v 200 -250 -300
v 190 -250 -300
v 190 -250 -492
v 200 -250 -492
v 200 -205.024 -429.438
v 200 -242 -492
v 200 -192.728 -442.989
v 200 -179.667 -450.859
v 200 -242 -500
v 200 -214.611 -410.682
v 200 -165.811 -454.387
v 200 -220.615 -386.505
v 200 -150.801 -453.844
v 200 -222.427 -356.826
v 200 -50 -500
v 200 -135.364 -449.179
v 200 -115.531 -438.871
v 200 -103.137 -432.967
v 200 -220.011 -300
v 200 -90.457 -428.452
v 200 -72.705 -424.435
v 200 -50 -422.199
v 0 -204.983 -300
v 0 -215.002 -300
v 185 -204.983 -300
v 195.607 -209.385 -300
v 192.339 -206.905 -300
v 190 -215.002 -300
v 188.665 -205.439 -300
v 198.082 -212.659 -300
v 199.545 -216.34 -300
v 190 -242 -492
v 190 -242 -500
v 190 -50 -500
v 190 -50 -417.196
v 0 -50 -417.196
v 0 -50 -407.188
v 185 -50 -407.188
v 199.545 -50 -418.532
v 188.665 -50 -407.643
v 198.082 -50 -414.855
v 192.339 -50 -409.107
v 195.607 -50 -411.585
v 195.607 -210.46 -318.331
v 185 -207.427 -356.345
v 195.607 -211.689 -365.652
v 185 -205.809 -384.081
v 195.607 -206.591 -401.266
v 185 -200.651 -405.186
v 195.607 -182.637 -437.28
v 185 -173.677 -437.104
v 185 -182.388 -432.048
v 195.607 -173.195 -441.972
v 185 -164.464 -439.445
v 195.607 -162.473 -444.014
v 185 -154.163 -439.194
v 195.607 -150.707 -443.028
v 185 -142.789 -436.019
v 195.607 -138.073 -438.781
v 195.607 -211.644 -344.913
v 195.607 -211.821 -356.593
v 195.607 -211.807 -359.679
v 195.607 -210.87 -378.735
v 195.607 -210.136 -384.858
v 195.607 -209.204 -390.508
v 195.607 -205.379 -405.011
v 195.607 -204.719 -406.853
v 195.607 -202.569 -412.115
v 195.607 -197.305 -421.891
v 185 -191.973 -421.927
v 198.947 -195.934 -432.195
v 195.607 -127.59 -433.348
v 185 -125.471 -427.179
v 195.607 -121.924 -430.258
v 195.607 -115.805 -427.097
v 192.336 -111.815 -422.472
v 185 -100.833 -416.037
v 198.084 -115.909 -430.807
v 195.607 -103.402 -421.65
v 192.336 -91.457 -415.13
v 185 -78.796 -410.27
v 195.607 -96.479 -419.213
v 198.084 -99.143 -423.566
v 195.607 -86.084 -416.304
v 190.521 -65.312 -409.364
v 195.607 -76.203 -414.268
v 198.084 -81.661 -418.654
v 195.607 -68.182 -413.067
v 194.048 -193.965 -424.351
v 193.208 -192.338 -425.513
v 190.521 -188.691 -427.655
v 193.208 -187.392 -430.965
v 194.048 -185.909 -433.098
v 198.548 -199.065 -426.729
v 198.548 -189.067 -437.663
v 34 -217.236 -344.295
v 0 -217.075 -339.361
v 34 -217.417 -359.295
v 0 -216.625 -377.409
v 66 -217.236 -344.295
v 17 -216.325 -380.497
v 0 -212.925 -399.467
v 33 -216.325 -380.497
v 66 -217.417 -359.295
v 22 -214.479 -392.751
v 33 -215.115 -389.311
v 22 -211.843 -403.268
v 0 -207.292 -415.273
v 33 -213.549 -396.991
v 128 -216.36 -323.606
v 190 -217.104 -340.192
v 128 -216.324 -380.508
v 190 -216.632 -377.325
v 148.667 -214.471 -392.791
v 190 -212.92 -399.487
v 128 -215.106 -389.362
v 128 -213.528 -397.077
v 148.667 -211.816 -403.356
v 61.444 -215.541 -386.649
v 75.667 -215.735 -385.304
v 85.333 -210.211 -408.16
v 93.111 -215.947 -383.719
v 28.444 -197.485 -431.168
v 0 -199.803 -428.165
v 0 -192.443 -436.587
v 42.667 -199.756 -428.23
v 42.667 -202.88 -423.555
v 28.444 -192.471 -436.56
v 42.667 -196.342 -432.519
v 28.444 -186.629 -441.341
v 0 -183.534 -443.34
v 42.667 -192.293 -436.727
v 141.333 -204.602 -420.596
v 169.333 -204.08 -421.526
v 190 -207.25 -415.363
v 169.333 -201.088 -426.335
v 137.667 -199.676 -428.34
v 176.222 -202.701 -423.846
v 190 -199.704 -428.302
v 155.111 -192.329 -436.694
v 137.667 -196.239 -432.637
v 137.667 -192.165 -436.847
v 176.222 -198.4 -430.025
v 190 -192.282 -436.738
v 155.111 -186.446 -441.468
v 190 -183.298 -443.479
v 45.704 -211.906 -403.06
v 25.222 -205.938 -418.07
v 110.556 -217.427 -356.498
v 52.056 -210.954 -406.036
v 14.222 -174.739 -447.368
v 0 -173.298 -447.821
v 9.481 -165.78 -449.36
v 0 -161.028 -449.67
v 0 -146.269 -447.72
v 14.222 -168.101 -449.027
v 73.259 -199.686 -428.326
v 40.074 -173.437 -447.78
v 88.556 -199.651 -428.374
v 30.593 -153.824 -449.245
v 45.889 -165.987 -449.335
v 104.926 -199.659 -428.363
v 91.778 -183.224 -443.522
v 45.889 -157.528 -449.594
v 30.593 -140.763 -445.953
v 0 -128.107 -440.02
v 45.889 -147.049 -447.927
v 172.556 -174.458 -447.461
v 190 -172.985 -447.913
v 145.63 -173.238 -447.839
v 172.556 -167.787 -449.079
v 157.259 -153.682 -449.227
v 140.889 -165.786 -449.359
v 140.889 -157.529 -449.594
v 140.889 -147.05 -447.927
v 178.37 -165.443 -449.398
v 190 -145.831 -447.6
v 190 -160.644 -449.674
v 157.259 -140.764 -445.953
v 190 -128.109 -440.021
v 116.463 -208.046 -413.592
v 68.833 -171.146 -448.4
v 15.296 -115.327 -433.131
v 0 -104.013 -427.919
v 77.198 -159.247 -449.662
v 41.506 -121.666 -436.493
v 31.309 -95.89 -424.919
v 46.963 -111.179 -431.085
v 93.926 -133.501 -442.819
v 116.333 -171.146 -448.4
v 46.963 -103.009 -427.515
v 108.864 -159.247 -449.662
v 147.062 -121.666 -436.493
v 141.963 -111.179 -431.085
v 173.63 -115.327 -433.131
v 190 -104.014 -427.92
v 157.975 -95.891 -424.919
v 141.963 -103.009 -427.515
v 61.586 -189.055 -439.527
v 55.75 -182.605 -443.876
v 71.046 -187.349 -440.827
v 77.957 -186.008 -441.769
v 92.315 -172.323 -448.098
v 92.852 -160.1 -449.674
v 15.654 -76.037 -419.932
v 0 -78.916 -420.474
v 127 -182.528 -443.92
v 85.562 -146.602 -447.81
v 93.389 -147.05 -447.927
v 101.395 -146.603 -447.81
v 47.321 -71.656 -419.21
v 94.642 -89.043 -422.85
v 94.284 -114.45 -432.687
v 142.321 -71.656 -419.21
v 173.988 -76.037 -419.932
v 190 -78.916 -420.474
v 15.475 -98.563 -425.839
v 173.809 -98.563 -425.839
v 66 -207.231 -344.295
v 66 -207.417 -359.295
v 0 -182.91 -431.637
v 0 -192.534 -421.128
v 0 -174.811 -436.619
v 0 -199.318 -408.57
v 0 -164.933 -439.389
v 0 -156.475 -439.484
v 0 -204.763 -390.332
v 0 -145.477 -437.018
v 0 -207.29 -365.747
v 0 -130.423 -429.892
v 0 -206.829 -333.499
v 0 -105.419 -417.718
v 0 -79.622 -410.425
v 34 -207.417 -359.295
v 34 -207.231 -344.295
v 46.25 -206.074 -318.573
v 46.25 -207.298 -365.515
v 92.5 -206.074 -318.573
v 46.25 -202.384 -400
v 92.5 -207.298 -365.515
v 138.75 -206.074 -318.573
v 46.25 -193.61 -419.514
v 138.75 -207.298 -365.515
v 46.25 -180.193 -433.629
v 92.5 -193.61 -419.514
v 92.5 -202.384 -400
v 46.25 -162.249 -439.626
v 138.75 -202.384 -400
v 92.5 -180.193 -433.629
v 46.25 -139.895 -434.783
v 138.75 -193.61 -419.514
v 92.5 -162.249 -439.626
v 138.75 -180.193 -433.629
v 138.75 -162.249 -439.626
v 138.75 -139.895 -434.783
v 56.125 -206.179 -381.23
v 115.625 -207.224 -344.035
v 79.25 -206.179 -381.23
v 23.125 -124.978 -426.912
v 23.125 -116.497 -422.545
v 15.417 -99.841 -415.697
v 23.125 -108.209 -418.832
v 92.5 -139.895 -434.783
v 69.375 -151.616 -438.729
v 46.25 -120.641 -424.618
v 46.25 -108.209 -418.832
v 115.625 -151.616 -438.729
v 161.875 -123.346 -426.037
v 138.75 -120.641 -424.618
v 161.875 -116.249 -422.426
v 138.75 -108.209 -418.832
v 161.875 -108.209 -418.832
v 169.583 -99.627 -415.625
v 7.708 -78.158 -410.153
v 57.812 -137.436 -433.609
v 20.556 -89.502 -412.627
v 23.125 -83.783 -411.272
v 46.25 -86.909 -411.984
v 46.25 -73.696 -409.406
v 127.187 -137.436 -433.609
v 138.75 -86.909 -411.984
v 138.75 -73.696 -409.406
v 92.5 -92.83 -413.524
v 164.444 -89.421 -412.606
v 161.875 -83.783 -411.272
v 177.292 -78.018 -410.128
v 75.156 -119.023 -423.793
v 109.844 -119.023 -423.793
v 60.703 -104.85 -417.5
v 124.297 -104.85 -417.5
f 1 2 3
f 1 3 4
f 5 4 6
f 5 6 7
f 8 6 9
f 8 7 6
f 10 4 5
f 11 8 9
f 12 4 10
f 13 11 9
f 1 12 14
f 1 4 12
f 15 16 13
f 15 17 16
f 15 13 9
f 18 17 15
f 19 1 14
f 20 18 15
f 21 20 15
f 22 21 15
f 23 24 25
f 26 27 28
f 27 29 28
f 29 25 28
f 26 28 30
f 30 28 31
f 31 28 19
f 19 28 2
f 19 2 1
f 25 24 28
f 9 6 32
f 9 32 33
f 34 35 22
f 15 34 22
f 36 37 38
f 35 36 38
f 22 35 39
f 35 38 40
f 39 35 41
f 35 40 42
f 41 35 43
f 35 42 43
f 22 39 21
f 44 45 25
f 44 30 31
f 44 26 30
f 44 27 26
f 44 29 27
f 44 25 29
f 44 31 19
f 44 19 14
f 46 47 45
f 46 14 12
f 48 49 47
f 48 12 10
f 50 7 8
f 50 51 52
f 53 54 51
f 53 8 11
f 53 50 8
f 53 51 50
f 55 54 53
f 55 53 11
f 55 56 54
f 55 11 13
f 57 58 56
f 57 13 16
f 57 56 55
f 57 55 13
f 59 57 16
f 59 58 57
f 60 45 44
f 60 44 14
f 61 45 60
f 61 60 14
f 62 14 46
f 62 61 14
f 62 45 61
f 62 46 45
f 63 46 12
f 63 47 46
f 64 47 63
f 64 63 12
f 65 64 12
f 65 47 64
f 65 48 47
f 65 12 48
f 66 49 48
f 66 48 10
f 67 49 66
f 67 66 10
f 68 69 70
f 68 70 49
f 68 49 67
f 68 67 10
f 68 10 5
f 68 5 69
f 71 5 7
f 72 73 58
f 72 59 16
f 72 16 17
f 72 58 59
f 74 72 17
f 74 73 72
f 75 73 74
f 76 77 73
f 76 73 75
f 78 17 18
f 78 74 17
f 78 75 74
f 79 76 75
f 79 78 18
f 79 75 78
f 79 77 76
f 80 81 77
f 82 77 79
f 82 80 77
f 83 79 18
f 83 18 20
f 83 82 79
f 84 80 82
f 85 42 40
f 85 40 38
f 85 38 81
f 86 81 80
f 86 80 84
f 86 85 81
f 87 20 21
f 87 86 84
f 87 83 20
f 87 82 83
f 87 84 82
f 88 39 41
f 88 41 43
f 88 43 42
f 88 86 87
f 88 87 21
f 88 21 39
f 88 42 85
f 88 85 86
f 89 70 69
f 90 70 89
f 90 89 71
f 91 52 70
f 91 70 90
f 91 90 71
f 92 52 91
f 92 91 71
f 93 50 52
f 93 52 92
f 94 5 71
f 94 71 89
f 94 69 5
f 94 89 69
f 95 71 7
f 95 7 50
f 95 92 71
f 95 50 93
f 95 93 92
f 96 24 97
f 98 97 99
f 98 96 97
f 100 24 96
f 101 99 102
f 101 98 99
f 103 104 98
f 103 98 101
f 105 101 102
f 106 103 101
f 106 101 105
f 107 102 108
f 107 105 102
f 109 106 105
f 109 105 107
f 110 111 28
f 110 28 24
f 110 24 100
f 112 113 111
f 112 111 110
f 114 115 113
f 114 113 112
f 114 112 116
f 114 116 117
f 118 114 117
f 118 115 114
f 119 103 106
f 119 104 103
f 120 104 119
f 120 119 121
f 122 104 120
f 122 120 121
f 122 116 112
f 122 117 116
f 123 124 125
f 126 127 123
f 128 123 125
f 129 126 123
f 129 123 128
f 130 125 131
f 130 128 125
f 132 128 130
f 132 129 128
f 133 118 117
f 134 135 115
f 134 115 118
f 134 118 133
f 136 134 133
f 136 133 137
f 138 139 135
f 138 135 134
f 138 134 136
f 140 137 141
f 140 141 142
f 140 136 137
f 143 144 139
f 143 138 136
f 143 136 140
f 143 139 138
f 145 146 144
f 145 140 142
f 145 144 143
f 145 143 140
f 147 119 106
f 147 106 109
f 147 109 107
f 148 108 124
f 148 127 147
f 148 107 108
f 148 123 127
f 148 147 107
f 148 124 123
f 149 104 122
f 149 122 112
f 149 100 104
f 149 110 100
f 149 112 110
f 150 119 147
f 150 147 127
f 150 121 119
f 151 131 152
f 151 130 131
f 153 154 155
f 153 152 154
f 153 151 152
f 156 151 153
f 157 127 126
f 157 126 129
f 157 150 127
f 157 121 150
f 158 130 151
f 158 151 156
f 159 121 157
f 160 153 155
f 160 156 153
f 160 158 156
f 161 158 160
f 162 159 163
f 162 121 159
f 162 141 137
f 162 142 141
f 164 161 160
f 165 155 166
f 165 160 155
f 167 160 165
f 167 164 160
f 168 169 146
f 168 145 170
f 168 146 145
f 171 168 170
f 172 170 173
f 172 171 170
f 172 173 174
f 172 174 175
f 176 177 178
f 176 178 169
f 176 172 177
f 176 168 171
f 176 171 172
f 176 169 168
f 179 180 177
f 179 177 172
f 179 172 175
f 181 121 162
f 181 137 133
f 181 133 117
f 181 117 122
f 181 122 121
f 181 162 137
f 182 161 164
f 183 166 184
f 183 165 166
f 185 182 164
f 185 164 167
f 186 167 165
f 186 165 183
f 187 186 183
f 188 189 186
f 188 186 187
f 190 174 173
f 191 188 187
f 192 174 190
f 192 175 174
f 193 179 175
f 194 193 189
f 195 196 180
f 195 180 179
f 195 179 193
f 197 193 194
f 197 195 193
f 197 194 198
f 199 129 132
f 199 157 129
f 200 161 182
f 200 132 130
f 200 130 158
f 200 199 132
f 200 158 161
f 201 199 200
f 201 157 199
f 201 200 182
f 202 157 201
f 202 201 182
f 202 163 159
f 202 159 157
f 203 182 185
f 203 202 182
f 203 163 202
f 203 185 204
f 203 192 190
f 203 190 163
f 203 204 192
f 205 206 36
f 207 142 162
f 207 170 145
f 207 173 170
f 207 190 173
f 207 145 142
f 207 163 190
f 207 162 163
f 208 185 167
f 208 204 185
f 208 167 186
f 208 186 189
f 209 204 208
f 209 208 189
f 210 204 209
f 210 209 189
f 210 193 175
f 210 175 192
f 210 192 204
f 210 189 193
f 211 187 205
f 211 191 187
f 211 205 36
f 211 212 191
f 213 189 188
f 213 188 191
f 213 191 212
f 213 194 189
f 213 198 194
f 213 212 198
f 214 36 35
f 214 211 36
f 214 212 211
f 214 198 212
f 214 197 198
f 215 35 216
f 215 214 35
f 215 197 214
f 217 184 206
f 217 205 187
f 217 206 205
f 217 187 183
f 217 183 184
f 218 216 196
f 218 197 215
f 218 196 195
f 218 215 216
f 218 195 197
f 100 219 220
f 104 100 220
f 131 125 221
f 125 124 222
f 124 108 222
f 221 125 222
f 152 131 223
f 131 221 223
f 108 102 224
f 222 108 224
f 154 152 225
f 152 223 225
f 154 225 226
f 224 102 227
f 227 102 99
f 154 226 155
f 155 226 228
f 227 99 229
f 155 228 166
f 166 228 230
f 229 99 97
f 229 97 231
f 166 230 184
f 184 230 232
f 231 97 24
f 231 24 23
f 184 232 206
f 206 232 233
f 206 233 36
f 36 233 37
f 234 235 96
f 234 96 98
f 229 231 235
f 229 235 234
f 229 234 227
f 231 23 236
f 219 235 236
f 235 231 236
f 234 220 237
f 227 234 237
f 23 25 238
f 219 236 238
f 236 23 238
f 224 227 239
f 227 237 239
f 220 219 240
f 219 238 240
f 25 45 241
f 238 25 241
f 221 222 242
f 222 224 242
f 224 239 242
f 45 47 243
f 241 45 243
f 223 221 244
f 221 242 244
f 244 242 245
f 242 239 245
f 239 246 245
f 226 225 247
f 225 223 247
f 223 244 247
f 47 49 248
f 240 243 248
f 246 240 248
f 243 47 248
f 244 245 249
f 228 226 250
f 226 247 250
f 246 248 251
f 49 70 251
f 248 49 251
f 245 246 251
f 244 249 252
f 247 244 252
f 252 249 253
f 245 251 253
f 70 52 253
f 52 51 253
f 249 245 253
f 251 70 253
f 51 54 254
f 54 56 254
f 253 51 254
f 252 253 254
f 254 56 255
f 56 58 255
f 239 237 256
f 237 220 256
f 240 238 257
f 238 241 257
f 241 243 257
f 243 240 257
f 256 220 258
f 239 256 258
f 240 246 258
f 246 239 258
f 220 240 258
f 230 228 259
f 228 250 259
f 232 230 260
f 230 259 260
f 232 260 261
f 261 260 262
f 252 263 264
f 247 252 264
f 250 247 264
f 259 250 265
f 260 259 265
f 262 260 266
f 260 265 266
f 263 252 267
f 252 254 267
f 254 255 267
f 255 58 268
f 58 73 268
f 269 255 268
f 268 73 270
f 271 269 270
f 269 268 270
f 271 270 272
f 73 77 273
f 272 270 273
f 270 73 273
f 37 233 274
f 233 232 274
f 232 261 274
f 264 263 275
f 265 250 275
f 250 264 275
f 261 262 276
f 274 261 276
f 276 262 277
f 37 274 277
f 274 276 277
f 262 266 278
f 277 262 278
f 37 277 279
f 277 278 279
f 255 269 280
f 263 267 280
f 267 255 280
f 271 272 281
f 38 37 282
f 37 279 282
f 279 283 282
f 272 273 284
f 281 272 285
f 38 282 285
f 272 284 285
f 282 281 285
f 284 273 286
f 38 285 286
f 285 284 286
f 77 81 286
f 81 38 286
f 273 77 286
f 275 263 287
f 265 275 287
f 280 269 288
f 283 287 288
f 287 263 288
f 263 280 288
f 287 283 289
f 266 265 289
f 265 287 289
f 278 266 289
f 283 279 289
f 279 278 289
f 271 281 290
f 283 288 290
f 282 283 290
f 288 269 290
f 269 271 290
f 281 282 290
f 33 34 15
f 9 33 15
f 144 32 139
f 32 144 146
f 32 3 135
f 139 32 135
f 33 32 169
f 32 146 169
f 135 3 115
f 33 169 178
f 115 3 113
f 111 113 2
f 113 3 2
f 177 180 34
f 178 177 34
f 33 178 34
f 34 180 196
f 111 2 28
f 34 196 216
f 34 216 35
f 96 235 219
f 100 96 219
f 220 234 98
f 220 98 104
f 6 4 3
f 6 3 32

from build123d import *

# Parameters (mm, degrees)
SKETCH_1_W           = 80
SKETCH_1_H           = 100
EXTRUDE_1_DEPTH      = 100
SKETCH_2_W           = 80
SKETCH_2_H           = 85
CUT_EXTRUDE_1_DEPTH  = 90
CUT_EXTRUDE_5_DEPTH  = 138.477270849
SHELL_2_T            = -2
FILLET_1_R           = 3
FILLET_2_R           = 5
FILLET_3_R           = 3
SKETCH_6_W           = 3.8
SKETCH_6_H           = 2.5
CUT_EXTRUDE_6_DEPTH  = 85
SKETCH_8_W           = 6.4
SKETCH_8_H           = 3
CUT_EXTRUDE_7_DEPTH  = 100
SKETCH_11_W          = 2
SKETCH_11_H          = 1
CUT_EXTRUDE_8_DEPTH  = 119.74342103
SCALE_1_SCALE        = 5
SKETCH_12_W          = 400
SKETCH_12_H          = 300
SKETCH_12_W_2        = 185
SKETCH_12_H_2        = 29.670884313
CUT_EXTRUDE_11_DEPTH = 594.717104512
SKETCH_14_W          = 200
SKETCH_14_H          = 300
CUT_EXTRUDE_12_DEPTH = 575.45626481
SKETCH_15_W          = 8
SKETCH_15_H          = 8
CUT_EXTRUDE_13_DEPTH = 10


with BuildPart() as part:
    # 스케치1 → 보스-돌출1 (new body)
    with BuildSketch(Plane.XY):
        Rectangle(SKETCH_1_W, SKETCH_1_H)
    extrude(amount=-EXTRUDE_1_DEPTH)

    # 스케치2 → 컷-돌출1 (cut)
    with BuildSketch(Plane(origin=(40, 0, 0), x_dir=(0, 0, -1), z_dir=(1, 0, 0))):
        with Locations((40, 7.5)):
            Rectangle(SKETCH_2_W, SKETCH_2_H)
    extrude(amount=-CUT_EXTRUDE_1_DEPTH, mode=Mode.SUBTRACT)

    # 스케치5 → 컷-돌출5 (cut, through all)
    with BuildSketch(Plane(origin=(40, 0, 0), x_dir=(0, 0, -1), z_dir=(1, 0, 0))):
        with BuildLine():
            add(Edge.make_bspline(
                [(0, -39.376697629), (18.60893103, -37.813832642), (60.522018707, -41.448787519), (82.629316251, -41.815039561), (94.476954899, -29.981594577), (72.35205171, -11.407179683), (96, 50)],
                knots=[0, 0, 0, 0, 0.361871867, 0.526261735, 0.755385015, 1, 1, 1, 1], degree=3))
            Line((96, 50), (80, 50))
            Line((80, 50), (80, -35))
            Line((80, -35), (0, -35))
            Line((0, -35), (0, -39.376697629))
        make_face()
    extrude(amount=-CUT_EXTRUDE_5_DEPTH, mode=Mode.SUBTRACT)

    # 쉘2
    shell_2_openings = [part.faces().sort_by_distance(p)[0] for p in [
        (0, 0, -100),
        (0, -50, -50),
    ]]
    offset(amount=SHELL_2_T, openings=shell_2_openings, kind=Kind.INTERSECTION)

    # 필렛1
    fillet_1_edges = [part.edges().sort_by_distance(p)[0] for p in [
        (0, 50, -96),
    ]]
    fillet(fillet_1_edges, radius=FILLET_1_R)

    # 필렛2
    fillet_2_edges = [part.edges().sort_by_distance(p)[0] for p in [
        (0, -39.376697629, 0),
    ]]
    fillet(fillet_2_edges, radius=FILLET_2_R)

    # 필렛3
    fillet_3_edges = [part.edges().sort_by_distance(p)[0] for p in [
        (40, -47.032911569, 0),
        (40, 49.469386486, -96.360930071),
        (-40, 49.469386486, -96.360930071),
        (40, -34.292790316, -87.583679146),
        (-40, -34.292790311, -87.583679133),
        (40, -40.61329303, -1.383366779),
        (-40, -47.032911569, 0),
        (-40, -40.61329303, -1.383366779),
        (-40, 50, -99.032247048),
        (40, 50, -99.032247048),
    ]]
    fillet(fillet_3_edges, radius=FILLET_3_R)

    # 스케치6 → 컷-돌출6 (cut)
    with BuildSketch(Plane(origin=(0, 0, -100), x_dir=(-1, 0, 0), z_dir=(0, 0, -1))):
        with Locations((-10, 10)):
            Rectangle(SKETCH_6_W, SKETCH_6_H)
        with Locations((10, 10)):
            Rectangle(SKETCH_6_W, SKETCH_6_H)
    extrude(amount=-CUT_EXTRUDE_6_DEPTH, mode=Mode.SUBTRACT)

    # 스케치8 → 컷-돌출7 (cut)
    with BuildSketch(Plane(origin=(0, 50, 0), x_dir=(1, 0, 0), z_dir=(0, 1, 0))):
        with Locations((-10, 70.358931696)):
            Rectangle(SKETCH_8_W, SKETCH_8_H)
        with Locations((10, 70.358931696)):
            Rectangle(SKETCH_8_W, SKETCH_8_H)
    extrude(amount=-CUT_EXTRUDE_7_DEPTH, mode=Mode.SUBTRACT)

    # 스케치11 → 컷-돌출8 (cut, through all)
    with BuildSketch(Plane(origin=(0, 0, -100), x_dir=(-1, 0, 0), z_dir=(0, 0, -1))):
        with Locations((-10, 3.626900341)):
            Rectangle(SKETCH_11_W, SKETCH_11_H)
        with Locations((10, 3.626900341)):
            Rectangle(SKETCH_11_W, SKETCH_11_H)
    extrude(amount=-CUT_EXTRUDE_8_DEPTH, mode=Mode.SUBTRACT)


with BuildPart() as part_1:
    # 축척1: scaled about (0, 0, 0)
    add(part.part.scale(SCALE_1_SCALE))

    # 스케치12 → 컷-돌출11 (cut, through all)
    with BuildSketch(Plane.XY):
        with Locations((0, 100)):
            Rectangle(SKETCH_12_W, SKETCH_12_H)
        Polygon((0, -50), (-200, -50), (-200, -250), (-185, -250), (-185, -220.329115687), (0, -220.329115687), align=None)
        with Locations((-92.5, -235.164557844)):
            Rectangle(SKETCH_12_W_2, SKETCH_12_H_2)
    extrude(amount=-CUT_EXTRUDE_11_DEPTH, mode=Mode.SUBTRACT)

    # 스케치14 → 컷-돌출12 (cut, through all)
    with BuildSketch(Plane.XZ.offset(250)):
        with Locations((100, -150)):
            Rectangle(SKETCH_14_W, SKETCH_14_H)
    extrude(amount=-CUT_EXTRUDE_12_DEPTH, mode=Mode.SUBTRACT)

    # 스케치15 → 컷-돌출13 (cut)
    with BuildSketch(Plane(origin=(200, 0, 0), x_dir=(0, 0, -1), z_dir=(1, 0, 0))):
        with Locations((496, -246)):
            Rectangle(SKETCH_15_W, SKETCH_15_H)
    extrude(amount=-CUT_EXTRUDE_13_DEPTH, mode=Mode.SUBTRACT)


solid = part_1.part
